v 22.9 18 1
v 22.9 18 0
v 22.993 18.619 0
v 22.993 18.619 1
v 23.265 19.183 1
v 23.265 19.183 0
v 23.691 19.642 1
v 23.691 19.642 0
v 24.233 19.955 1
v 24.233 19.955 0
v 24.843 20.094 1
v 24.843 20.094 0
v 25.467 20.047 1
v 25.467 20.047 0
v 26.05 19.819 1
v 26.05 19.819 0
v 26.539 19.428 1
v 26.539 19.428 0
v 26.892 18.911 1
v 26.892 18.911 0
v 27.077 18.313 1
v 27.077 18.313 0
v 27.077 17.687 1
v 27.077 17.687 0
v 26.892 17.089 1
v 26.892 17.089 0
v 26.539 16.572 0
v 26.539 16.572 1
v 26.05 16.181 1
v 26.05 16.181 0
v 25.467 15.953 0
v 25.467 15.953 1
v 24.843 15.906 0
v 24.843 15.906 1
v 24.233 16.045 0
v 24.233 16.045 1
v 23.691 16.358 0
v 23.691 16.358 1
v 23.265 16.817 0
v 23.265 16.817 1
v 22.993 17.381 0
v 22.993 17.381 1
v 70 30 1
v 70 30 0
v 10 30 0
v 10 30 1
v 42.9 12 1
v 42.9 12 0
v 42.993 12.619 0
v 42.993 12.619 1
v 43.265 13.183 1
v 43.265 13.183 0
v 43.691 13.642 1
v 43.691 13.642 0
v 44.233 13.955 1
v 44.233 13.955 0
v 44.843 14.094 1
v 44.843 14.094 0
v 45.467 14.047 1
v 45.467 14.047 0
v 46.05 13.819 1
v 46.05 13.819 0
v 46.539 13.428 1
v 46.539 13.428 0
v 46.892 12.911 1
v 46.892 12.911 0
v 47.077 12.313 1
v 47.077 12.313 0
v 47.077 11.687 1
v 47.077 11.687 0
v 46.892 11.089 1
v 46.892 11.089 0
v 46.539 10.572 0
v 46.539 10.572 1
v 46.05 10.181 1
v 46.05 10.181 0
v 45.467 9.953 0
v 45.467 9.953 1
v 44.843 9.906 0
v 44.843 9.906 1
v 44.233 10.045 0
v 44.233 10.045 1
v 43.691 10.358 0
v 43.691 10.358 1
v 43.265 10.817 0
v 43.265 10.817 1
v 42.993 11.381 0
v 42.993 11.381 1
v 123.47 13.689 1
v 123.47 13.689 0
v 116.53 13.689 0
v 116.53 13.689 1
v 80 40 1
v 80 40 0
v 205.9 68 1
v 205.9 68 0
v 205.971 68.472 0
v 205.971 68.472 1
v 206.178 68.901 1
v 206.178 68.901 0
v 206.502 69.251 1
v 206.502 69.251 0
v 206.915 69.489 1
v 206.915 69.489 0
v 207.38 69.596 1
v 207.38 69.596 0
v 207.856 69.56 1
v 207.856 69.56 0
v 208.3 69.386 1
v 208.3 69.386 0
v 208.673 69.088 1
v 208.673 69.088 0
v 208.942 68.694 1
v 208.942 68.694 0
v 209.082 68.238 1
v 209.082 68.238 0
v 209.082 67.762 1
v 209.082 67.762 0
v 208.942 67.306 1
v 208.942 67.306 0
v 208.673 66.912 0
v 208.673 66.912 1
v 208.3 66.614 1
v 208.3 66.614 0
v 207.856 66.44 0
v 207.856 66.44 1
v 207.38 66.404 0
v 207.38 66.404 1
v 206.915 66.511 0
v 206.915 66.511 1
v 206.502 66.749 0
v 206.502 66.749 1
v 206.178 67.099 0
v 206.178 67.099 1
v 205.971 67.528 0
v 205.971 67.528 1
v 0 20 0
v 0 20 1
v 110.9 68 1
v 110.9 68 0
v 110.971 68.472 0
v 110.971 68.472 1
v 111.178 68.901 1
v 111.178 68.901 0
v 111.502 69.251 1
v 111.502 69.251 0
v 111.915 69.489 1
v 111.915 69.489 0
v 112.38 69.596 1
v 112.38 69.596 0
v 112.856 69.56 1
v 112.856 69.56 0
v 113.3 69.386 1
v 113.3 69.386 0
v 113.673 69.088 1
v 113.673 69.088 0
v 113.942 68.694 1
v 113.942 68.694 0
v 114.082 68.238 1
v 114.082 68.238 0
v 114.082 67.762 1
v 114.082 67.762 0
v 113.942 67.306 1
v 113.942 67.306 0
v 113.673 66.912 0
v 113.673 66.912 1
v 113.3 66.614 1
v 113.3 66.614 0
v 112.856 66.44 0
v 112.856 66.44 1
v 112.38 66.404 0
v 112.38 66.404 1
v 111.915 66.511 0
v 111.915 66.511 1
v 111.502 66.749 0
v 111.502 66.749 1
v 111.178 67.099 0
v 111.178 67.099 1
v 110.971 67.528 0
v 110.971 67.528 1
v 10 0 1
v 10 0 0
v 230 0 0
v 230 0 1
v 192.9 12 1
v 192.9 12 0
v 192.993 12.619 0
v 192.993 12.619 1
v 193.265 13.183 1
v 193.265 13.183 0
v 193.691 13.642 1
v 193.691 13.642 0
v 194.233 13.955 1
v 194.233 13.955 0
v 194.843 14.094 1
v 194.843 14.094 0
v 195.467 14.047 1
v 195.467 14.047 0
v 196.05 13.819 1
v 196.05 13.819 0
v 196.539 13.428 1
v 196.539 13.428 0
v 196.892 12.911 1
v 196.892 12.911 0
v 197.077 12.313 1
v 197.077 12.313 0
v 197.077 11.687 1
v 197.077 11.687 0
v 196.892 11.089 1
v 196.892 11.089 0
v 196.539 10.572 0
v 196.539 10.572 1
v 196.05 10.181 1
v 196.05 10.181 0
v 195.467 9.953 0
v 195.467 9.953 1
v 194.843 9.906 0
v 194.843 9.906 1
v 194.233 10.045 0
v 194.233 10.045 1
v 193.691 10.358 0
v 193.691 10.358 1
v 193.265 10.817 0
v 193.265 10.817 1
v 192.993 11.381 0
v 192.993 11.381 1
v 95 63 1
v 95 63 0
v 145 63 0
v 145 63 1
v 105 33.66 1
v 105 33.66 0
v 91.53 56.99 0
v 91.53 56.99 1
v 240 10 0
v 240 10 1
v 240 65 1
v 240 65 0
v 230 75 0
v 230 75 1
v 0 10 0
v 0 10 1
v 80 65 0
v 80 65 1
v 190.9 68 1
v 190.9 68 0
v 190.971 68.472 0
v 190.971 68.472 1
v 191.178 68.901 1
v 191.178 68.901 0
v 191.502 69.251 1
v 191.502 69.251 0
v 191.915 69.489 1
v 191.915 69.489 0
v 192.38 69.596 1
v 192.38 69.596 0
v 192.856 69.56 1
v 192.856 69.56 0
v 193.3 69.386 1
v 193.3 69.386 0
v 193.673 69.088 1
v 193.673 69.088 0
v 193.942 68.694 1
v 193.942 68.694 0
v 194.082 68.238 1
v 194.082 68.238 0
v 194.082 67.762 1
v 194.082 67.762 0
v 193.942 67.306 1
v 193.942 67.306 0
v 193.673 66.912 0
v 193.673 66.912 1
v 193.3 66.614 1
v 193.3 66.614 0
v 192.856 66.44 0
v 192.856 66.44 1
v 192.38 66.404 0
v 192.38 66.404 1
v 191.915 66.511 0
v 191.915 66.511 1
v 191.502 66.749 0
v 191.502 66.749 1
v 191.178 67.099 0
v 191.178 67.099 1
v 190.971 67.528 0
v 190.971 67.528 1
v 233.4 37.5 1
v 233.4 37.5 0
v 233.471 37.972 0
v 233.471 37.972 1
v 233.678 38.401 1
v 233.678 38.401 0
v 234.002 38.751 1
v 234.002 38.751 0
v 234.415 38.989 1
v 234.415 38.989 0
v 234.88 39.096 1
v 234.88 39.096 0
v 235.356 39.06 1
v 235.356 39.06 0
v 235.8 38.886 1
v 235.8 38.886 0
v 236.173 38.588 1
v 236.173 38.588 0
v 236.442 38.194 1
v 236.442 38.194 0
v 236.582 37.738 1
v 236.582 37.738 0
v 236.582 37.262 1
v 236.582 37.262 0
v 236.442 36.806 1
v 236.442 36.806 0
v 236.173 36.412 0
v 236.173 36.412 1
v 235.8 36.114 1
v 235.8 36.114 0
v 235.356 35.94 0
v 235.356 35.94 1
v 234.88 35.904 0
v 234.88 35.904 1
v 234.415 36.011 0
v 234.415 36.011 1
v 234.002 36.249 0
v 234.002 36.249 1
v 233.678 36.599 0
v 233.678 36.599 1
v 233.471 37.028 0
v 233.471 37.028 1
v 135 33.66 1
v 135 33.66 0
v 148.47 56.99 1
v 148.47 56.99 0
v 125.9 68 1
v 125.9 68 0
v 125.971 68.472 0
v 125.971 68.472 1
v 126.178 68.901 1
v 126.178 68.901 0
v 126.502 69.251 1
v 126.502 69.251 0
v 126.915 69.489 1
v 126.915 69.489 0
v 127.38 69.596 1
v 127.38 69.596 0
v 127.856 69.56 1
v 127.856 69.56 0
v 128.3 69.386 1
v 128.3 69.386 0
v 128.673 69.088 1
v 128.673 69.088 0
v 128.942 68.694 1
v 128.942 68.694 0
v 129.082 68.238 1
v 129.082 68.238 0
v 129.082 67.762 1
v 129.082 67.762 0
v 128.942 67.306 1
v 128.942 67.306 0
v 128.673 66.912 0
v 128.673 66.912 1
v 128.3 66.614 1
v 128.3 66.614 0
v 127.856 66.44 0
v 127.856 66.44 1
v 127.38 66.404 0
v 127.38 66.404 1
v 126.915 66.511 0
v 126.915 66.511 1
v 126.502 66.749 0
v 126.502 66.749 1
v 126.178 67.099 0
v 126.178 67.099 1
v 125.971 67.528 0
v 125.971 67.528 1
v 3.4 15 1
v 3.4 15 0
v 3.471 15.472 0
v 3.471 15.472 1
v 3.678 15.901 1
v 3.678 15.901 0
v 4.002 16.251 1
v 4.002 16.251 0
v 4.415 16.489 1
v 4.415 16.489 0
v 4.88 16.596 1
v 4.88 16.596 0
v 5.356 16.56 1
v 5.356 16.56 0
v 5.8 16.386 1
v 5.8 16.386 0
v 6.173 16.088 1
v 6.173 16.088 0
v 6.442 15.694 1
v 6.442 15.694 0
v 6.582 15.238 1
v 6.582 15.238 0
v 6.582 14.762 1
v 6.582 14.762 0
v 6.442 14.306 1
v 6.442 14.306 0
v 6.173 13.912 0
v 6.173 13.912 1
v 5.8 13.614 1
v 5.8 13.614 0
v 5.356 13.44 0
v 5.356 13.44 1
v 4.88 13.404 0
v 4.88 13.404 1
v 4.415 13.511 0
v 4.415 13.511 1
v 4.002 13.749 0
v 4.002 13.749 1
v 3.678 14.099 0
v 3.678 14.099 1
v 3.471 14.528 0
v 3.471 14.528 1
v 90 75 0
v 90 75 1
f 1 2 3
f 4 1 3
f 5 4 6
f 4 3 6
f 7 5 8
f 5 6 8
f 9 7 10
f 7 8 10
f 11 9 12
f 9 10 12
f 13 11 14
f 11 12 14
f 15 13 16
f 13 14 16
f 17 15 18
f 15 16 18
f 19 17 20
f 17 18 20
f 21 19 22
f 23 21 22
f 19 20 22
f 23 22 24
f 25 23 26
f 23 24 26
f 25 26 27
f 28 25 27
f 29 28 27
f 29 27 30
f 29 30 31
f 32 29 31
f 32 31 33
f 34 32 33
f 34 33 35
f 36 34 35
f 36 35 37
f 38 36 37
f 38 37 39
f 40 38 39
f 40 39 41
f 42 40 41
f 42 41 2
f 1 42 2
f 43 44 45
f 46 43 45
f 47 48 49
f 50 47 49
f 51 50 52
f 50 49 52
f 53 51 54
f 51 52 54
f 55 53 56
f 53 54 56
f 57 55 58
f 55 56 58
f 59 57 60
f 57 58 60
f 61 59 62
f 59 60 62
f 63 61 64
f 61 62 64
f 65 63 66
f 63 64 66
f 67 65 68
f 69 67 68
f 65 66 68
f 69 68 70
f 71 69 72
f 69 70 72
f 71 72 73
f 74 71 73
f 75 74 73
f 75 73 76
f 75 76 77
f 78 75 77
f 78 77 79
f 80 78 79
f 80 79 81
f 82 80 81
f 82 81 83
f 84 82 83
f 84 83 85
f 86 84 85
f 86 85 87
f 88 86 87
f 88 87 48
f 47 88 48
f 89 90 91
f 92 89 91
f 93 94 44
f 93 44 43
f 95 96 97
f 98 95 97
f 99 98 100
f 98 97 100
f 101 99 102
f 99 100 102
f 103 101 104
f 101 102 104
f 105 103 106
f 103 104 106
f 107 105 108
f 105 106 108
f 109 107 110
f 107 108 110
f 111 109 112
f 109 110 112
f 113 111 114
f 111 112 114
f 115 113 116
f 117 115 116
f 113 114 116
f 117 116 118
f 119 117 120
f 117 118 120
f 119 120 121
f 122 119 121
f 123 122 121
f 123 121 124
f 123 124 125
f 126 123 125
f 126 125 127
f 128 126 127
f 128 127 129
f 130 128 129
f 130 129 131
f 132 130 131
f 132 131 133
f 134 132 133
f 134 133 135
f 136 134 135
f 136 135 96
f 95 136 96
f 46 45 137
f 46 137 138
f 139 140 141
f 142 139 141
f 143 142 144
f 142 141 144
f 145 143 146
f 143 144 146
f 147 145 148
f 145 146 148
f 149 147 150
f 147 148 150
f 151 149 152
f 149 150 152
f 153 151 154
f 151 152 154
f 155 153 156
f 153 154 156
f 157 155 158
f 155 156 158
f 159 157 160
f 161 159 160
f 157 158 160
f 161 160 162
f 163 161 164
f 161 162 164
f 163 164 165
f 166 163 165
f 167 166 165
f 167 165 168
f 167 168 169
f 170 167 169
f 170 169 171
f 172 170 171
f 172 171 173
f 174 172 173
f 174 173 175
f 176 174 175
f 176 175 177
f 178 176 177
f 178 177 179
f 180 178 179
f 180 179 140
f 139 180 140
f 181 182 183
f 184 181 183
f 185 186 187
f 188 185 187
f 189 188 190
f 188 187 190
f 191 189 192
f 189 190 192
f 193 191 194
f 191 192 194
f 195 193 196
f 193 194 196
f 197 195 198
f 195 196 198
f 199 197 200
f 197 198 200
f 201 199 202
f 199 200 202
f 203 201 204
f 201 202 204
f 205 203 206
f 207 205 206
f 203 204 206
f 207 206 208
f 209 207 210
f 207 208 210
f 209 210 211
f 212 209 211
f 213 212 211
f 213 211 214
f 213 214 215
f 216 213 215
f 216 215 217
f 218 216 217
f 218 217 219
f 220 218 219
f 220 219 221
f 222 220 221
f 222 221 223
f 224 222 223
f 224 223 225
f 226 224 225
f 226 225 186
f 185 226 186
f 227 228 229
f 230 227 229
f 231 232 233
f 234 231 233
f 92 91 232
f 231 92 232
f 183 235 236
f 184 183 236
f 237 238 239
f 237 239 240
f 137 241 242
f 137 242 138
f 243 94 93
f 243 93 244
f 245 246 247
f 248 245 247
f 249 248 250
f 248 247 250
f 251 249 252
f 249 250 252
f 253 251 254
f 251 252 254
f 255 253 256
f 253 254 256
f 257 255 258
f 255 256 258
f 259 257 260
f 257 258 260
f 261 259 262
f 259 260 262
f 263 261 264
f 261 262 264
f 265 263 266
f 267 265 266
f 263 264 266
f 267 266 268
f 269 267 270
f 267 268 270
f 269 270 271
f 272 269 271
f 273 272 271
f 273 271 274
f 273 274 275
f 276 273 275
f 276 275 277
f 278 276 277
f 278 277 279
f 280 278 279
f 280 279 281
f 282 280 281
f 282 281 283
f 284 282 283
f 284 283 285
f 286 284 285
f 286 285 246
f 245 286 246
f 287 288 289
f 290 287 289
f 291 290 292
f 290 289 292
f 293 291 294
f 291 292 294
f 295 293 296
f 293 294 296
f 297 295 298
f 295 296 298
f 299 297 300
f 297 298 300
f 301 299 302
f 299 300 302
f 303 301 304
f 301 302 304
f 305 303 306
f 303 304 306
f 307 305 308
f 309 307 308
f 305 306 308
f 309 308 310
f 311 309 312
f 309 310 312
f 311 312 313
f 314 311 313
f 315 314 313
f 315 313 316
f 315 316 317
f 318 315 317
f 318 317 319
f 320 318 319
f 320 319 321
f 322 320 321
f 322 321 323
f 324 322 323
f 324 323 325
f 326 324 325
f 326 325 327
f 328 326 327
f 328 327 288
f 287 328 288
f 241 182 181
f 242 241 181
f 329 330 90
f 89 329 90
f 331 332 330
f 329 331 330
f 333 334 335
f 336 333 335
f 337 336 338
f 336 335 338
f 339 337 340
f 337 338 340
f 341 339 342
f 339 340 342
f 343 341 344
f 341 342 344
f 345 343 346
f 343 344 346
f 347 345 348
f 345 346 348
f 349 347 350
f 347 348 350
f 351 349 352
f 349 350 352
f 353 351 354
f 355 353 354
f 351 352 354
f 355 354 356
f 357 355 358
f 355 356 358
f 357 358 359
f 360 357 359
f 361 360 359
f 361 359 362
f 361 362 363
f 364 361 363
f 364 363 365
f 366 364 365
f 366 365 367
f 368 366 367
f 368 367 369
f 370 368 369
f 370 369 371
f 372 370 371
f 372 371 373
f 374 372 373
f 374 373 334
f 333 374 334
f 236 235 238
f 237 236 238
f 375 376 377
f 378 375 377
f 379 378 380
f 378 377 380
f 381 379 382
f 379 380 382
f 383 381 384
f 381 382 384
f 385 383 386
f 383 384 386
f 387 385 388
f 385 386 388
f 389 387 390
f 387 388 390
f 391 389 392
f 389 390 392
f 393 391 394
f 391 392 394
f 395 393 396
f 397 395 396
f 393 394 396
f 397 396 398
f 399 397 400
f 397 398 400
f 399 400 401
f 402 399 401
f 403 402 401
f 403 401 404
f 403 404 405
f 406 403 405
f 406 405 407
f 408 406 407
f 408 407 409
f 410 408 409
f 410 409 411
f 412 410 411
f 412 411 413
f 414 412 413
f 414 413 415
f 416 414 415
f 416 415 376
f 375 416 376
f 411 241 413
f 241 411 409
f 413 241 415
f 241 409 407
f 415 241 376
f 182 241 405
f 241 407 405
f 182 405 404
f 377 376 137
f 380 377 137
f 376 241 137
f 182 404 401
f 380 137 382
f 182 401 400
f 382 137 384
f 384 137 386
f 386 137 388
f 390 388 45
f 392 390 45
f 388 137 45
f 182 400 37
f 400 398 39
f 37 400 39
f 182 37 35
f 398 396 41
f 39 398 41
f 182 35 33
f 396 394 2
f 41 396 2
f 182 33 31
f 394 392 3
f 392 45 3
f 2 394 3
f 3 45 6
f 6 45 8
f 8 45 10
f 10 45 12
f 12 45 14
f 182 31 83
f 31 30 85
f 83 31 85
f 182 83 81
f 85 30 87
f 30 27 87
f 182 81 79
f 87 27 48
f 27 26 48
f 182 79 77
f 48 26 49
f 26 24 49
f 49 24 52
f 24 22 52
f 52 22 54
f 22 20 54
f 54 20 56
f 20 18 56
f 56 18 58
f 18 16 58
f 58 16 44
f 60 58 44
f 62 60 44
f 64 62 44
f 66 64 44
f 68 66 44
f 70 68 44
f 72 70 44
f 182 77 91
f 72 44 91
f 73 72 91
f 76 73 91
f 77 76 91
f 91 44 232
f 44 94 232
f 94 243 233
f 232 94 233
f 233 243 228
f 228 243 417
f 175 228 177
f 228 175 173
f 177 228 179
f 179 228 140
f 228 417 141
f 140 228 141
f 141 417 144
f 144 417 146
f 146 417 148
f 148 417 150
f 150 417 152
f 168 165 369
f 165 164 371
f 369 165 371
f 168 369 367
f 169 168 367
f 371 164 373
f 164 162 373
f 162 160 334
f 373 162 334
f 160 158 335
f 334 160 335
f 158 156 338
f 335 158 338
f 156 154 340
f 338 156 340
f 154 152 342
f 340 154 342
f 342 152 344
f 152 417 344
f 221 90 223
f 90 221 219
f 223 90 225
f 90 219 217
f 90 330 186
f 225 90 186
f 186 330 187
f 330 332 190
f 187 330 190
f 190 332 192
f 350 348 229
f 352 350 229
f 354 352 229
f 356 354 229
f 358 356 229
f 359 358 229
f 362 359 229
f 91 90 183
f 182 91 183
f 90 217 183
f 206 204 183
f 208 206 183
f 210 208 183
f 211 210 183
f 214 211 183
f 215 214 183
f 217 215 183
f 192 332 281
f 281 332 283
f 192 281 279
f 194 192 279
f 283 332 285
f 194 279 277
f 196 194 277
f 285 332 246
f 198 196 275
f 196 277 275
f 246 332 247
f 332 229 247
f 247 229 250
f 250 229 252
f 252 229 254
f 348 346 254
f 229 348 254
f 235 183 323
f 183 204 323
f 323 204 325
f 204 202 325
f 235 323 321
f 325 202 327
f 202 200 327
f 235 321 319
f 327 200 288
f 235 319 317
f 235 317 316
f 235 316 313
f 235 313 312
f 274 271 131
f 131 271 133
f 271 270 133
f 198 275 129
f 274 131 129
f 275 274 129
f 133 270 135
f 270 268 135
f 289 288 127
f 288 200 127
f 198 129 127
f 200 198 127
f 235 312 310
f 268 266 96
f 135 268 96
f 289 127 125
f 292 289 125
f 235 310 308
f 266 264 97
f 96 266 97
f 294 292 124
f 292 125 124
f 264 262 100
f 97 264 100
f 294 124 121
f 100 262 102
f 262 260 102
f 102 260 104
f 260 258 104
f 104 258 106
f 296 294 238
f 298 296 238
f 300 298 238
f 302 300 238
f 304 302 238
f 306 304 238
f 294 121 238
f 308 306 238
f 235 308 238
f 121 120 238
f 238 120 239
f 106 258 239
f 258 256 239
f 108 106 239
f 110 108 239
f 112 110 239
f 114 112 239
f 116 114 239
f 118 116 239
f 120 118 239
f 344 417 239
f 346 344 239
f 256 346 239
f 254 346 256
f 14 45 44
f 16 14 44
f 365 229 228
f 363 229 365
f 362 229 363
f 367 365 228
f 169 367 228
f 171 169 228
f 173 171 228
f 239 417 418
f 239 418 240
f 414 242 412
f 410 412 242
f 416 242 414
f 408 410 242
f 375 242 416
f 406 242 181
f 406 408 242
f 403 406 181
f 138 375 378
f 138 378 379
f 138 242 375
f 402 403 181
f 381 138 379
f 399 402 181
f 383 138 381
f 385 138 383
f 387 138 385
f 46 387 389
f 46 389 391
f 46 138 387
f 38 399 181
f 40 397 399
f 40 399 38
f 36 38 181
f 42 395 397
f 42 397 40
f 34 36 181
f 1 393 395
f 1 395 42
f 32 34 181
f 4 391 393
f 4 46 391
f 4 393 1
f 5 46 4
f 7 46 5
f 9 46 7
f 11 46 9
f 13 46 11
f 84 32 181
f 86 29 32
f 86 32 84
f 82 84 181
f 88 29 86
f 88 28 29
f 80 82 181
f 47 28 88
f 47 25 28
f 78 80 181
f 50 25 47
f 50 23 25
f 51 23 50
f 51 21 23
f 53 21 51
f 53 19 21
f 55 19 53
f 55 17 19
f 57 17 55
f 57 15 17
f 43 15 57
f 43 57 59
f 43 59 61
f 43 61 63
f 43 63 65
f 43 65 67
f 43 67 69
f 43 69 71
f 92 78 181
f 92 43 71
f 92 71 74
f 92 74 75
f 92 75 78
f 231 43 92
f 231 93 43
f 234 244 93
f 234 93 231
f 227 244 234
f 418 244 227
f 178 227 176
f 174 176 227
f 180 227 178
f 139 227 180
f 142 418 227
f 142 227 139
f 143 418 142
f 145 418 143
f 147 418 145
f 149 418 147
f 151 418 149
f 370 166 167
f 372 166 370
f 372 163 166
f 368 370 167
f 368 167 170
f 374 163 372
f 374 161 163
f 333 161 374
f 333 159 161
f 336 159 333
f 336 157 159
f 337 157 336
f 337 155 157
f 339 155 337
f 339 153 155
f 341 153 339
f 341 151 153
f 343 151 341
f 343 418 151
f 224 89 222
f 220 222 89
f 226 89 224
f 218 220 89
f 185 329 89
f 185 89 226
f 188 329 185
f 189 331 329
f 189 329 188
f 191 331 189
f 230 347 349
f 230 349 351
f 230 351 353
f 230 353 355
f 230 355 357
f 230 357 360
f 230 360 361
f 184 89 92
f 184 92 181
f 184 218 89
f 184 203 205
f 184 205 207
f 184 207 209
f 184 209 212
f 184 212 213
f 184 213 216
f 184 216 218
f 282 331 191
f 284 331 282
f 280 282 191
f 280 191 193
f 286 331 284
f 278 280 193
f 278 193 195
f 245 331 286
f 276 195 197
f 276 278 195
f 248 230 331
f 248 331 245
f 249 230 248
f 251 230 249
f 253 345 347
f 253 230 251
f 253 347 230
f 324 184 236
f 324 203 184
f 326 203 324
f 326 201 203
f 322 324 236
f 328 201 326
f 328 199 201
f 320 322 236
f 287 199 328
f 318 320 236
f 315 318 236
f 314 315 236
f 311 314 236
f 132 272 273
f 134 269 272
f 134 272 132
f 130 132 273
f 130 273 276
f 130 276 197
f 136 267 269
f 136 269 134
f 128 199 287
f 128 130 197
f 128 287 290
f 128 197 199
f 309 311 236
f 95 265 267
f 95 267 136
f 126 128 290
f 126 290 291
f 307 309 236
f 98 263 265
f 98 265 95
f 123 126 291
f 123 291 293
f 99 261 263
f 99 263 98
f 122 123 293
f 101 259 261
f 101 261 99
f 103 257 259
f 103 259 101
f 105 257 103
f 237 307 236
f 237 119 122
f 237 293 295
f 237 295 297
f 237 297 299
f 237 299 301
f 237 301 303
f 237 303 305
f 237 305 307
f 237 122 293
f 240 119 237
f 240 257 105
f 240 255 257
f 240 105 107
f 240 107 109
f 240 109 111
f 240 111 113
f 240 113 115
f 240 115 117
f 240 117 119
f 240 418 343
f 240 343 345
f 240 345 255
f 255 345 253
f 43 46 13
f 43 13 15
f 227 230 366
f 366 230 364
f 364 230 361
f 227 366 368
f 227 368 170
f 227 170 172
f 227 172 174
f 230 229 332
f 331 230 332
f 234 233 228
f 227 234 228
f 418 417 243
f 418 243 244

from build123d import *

# Parameters (mm, degrees)
SKETCH_1_W          = 240
SKETCH_1_H          = 75
EXTRUDE_1_DEPTH     = 1
CUT_EXTRUDE_2_DEPTH = 10
SKETCH_4_W          = 80
SKETCH_4_H          = 45
CUT_EXTRUDE_3_DEPTH = 10
CHAMFER_1_SIZE      = 10
SKETCH_5_R          = 1.6
SKETCH_5_R_2        = 2.1
CUT_EXTRUDE_4_DEPTH = 10
EXTRUDE_2_DEPTH     = 1


with BuildPart() as part:
    # 草图1 → 凸台-拉伸1 (new body)
    with BuildSketch(Plane.XY):
        with Locations((120, 37.5)):
            Rectangle(SKETCH_1_W, SKETCH_1_H)
    extrude(amount=EXTRUDE_1_DEPTH)

    # 草图3 → 切除-拉伸2 (cut)
    with BuildSketch(Plane(origin=(0, 0, 0), x_dir=(-1, 0, 0), z_dir=(0, 0, -1))):
        Polygon((-130, 7.679491924), (-110, 7.679491924), (-100, 25), (-110, 42.320508076), (-130, 42.320508076), (-140, 25), align=None)
        Polygon((-148.469655115, 56.990381057), (-135, 33.660254038), (-130, 42.320508076), (-110, 42.320508076), (-105, 33.660254038), (-91.530344885, 56.990381057), (-95, 63), (-145, 63), align=None)
    extrude(amount=-CUT_EXTRUDE_2_DEPTH, mode=Mode.SUBTRACT)

    # 草图4 → 切除-拉伸3 (cut)
    with BuildSketch(Plane(origin=(0, 0, 0), x_dir=(-1, 0, 0), z_dir=(0, 0, -1))):
        with Locations((-40, 52.5)):
            Rectangle(SKETCH_4_W, SKETCH_4_H)
    extrude(amount=-CUT_EXTRUDE_3_DEPTH, mode=Mode.SUBTRACT)

    # 倒角1
    chamfer_1_edges = [part.edges().sort_by_distance(p)[0] for p in [
        (80, 75, 0.5),
        (0, 30, 0.5),
        (80, 30, 0.5),
        (240, 75, 0.5),
        (240, 0, 0.5),
        (0, 0, 0.5),
    ]]
    chamfer(chamfer_1_edges, length=CHAMFER_1_SIZE)

    # 草图5 → 切除-拉伸4 (cut)
    with BuildSketch(Plane(origin=(0, 0, 0), x_dir=(-1, 0, 0), z_dir=(0, 0, -1))):
        with Locations((-5, 15)):
            Circle(SKETCH_5_R)
        with Locations((-195, 12)):
            Circle(SKETCH_5_R_2)
        with Locations((-45, 12)):
            Circle(SKETCH_5_R_2)
        with Locations((-235, 37.5)):
            Circle(SKETCH_5_R)
        with Locations((-207.5, 68)):
            Circle(SKETCH_5_R)
        with Locations((-192.5, 68)):
            Circle(SKETCH_5_R)
        with Locations((-127.5, 68)):
            Circle(SKETCH_5_R)
        with Locations((-112.5, 68)):
            Circle(SKETCH_5_R)
        with Locations((-25, 18)):
            Circle(SKETCH_5_R_2)
    extrude(amount=-CUT_EXTRUDE_4_DEPTH, mode=Mode.SUBTRACT)

    # 草图6 → 凸台-拉伸2 (add)
    with BuildSketch(Plane(origin=(0, 0, 0), x_dir=(-1, 0, 0), z_dir=(0, 0, -1))):
        Polygon((-135, 33.660254038), (-123.469655115, 13.689110868), (-116.530344885, 13.689110868), (-105, 33.660254038), (-100, 25), (-110, 7.679491924), (-130, 7.679491924), (-140, 25), align=None)
    extrude(amount=-EXTRUDE_2_DEPTH)


solid = part.part
